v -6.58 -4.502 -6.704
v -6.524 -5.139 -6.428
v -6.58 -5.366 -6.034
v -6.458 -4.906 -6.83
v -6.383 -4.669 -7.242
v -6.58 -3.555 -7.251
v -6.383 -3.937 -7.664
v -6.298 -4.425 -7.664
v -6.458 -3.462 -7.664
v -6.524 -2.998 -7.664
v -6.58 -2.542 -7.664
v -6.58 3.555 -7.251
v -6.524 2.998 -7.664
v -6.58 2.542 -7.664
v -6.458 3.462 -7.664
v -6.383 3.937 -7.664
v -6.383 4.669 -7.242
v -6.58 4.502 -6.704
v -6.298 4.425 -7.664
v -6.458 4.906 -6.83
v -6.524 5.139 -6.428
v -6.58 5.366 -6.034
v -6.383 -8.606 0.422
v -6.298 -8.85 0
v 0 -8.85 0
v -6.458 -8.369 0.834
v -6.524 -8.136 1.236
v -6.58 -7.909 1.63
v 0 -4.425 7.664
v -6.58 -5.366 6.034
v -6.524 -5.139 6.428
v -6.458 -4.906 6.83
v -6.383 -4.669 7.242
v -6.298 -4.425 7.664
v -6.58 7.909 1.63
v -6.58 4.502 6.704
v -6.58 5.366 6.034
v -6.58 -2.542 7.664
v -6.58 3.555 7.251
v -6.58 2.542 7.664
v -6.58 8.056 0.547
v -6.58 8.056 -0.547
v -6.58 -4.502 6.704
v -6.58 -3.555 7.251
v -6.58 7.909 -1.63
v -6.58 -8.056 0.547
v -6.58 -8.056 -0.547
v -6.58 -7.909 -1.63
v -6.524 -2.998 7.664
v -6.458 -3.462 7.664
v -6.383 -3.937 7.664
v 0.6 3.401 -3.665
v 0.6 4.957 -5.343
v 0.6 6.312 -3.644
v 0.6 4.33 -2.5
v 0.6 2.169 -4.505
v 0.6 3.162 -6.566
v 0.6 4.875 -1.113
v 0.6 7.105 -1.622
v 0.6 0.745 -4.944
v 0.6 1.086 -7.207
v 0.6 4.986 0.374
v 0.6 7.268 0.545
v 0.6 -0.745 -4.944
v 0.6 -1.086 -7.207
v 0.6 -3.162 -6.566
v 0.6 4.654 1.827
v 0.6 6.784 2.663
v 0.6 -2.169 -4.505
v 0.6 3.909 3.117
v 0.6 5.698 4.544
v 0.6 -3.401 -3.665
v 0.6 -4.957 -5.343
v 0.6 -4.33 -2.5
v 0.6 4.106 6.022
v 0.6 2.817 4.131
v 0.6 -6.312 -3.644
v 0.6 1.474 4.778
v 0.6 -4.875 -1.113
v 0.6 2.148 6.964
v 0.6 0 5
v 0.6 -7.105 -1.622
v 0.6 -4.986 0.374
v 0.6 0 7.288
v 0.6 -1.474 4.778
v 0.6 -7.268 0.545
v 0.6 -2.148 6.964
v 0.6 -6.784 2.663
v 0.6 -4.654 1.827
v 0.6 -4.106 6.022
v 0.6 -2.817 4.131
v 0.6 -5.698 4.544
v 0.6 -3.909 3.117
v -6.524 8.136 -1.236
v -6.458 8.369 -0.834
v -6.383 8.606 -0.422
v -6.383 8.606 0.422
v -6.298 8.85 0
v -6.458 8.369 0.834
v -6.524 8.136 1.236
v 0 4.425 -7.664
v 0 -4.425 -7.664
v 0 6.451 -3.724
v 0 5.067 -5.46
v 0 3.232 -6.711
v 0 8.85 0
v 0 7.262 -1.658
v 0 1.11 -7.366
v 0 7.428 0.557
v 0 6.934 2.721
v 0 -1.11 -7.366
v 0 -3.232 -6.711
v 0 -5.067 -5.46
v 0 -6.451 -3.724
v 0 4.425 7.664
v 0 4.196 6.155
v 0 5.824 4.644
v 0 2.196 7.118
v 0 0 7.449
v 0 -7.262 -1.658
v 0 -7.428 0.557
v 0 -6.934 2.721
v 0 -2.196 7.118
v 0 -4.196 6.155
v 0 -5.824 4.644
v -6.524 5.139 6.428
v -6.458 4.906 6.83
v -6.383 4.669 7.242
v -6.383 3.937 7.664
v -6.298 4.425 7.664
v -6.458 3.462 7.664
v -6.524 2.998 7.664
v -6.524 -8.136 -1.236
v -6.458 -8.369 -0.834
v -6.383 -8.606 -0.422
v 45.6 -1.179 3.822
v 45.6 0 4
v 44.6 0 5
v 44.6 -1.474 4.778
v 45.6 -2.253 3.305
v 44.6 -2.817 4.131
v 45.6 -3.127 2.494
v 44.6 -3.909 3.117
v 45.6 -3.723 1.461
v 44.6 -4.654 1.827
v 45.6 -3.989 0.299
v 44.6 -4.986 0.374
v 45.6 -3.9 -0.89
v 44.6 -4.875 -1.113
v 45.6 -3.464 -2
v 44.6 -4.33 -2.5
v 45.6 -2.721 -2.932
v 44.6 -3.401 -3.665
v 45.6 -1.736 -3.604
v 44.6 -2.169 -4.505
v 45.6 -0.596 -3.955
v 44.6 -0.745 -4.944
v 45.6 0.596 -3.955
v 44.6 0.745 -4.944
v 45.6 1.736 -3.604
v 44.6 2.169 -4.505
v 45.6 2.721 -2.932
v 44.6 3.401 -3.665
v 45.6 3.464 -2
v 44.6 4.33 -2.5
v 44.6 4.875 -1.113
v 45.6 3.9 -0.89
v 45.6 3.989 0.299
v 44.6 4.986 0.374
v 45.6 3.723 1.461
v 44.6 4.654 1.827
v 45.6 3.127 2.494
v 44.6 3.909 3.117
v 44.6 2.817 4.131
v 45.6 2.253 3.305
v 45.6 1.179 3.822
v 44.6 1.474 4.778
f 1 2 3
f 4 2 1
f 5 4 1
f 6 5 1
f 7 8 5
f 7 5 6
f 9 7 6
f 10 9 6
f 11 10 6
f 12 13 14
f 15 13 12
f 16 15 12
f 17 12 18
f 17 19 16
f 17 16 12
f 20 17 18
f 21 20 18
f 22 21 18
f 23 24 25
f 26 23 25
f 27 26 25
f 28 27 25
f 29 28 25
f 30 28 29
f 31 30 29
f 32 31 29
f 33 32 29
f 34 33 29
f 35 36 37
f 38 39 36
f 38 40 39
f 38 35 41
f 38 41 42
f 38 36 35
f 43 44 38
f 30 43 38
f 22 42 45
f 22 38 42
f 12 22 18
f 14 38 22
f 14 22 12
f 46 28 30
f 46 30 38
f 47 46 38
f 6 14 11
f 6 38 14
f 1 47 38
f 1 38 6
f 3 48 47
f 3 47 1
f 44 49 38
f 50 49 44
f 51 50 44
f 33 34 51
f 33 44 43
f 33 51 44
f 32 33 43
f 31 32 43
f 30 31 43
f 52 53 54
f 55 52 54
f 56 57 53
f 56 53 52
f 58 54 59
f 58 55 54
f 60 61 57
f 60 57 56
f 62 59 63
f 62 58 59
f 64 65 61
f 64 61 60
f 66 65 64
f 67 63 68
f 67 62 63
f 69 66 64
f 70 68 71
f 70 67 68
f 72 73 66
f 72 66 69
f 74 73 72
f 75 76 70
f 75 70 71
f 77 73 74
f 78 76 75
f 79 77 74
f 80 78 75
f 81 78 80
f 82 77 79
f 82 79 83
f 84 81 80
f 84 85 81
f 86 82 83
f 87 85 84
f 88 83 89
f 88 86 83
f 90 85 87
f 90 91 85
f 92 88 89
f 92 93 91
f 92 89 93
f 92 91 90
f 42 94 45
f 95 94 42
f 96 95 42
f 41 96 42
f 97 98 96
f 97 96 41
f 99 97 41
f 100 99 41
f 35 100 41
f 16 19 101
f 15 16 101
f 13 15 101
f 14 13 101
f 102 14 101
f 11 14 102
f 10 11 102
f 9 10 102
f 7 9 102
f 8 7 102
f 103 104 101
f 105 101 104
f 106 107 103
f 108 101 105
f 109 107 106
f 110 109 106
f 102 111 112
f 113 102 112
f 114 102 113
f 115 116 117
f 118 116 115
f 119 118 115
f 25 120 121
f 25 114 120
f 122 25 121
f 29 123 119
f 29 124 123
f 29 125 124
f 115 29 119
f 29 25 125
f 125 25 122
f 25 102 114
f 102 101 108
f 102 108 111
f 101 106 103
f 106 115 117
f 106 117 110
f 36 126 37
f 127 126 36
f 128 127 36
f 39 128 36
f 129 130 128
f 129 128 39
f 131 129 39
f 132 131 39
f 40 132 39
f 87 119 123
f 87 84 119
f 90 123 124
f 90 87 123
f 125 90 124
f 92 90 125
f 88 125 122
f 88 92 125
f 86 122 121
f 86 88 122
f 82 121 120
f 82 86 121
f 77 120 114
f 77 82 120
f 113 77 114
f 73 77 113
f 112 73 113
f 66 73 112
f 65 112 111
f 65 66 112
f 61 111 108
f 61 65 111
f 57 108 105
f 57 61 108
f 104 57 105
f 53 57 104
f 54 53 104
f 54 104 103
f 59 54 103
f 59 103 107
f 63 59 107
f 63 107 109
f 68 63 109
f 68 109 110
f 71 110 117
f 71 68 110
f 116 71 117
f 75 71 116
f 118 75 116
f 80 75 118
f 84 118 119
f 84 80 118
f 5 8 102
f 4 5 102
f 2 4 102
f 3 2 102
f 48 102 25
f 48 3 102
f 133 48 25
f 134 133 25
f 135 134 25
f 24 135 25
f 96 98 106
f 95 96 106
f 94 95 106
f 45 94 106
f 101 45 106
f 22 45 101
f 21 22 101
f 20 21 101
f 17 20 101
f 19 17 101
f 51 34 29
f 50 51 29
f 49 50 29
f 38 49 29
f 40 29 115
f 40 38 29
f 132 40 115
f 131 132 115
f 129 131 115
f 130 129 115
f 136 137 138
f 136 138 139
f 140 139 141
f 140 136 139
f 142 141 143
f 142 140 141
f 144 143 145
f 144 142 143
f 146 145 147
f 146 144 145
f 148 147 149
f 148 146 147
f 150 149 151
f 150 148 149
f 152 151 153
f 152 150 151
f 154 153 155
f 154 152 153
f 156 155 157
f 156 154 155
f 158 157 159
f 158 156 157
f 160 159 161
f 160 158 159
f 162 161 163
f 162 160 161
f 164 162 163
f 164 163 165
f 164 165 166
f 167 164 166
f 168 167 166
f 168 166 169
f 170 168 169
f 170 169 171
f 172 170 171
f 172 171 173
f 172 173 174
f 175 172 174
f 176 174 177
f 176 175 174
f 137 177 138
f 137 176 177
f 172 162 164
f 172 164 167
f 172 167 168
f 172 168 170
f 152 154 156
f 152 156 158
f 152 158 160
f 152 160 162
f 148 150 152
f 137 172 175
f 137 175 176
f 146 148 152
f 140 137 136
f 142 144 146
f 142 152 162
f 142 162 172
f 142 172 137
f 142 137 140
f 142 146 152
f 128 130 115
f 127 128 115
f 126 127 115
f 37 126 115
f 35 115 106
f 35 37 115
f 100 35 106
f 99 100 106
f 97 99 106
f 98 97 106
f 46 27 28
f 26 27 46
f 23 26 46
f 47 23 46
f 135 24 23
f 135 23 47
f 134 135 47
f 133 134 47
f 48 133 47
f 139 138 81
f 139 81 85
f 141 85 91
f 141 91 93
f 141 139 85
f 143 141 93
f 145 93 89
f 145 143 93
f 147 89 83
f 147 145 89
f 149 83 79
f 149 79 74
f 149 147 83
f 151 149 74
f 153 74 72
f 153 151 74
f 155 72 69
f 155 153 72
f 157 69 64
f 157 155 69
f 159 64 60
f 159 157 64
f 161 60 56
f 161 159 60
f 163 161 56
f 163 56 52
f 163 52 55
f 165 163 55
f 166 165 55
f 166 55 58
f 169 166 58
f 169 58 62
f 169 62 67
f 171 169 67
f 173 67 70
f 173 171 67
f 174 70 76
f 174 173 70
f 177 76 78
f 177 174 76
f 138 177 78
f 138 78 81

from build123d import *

# Parameters (mm, degrees)
SKETCH_2_OUTSIDE_W  = 31.274
SKETCH_2_OUTSIDE_H  = 31.274
CUT_EXTRUDE_1_DEPTH = 54.660016772
CHAMFER_1_SIZE      = 1


with BuildPart() as part:
    # Эскиз1 → Повернуть1 (revolve)
    with BuildSketch(Plane.XY, mode=Mode.PRIVATE) as revolve_1_sk:
        Polygon((-6.58, 0), (-6.58, 8.85), (0, 8.85), (0, 7.448974596), (0.6, 7.288205081), (0.6, 5), (45.6, 5), (45.6, 0), align=None)
    revolve(revolve_1_sk.sketch.rotate(Axis((-1000, 0, 0), (1, 0, 0)), 90), axis=Axis((-1000, 0, 0), (1, 0, 0)))

    # Эскиз2 outside → Вырез-Вытянуть1 (cut, through all)
    with BuildSketch(Plane.ZY.offset(6.58)):
        Rectangle(SKETCH_2_OUTSIDE_W, SKETCH_2_OUTSIDE_H)
        Polygon((0, -8.85), (7.664324823, -4.425), (7.664324823, 4.425), (0, 8.85), (-7.664324823, 4.425), (-7.664324823, -4.425), align=None, mode=Mode.SUBTRACT)
    extrude(amount=-CUT_EXTRUDE_1_DEPTH, mode=Mode.SUBTRACT)

    # Эскиз4 → Вырез-Повернуть1 (revolve, cut)
    with BuildSketch(Plane.XY):
        Polygon((-6.58, 8.075), (-6.297923068, 8.85), (-6.58, 8.85), align=None)
    revolve(axis=Axis((-1000, 0, 0), (1, 0, 0)), mode=Mode.SUBTRACT)

    # Фаска1
    chamfer_1_edges = [part.edges().sort_by_distance(p)[0] for p in [
        (45.6, 0, -5),
    ]]
    chamfer(chamfer_1_edges, length=CHAMFER_1_SIZE)


solid = part.part
